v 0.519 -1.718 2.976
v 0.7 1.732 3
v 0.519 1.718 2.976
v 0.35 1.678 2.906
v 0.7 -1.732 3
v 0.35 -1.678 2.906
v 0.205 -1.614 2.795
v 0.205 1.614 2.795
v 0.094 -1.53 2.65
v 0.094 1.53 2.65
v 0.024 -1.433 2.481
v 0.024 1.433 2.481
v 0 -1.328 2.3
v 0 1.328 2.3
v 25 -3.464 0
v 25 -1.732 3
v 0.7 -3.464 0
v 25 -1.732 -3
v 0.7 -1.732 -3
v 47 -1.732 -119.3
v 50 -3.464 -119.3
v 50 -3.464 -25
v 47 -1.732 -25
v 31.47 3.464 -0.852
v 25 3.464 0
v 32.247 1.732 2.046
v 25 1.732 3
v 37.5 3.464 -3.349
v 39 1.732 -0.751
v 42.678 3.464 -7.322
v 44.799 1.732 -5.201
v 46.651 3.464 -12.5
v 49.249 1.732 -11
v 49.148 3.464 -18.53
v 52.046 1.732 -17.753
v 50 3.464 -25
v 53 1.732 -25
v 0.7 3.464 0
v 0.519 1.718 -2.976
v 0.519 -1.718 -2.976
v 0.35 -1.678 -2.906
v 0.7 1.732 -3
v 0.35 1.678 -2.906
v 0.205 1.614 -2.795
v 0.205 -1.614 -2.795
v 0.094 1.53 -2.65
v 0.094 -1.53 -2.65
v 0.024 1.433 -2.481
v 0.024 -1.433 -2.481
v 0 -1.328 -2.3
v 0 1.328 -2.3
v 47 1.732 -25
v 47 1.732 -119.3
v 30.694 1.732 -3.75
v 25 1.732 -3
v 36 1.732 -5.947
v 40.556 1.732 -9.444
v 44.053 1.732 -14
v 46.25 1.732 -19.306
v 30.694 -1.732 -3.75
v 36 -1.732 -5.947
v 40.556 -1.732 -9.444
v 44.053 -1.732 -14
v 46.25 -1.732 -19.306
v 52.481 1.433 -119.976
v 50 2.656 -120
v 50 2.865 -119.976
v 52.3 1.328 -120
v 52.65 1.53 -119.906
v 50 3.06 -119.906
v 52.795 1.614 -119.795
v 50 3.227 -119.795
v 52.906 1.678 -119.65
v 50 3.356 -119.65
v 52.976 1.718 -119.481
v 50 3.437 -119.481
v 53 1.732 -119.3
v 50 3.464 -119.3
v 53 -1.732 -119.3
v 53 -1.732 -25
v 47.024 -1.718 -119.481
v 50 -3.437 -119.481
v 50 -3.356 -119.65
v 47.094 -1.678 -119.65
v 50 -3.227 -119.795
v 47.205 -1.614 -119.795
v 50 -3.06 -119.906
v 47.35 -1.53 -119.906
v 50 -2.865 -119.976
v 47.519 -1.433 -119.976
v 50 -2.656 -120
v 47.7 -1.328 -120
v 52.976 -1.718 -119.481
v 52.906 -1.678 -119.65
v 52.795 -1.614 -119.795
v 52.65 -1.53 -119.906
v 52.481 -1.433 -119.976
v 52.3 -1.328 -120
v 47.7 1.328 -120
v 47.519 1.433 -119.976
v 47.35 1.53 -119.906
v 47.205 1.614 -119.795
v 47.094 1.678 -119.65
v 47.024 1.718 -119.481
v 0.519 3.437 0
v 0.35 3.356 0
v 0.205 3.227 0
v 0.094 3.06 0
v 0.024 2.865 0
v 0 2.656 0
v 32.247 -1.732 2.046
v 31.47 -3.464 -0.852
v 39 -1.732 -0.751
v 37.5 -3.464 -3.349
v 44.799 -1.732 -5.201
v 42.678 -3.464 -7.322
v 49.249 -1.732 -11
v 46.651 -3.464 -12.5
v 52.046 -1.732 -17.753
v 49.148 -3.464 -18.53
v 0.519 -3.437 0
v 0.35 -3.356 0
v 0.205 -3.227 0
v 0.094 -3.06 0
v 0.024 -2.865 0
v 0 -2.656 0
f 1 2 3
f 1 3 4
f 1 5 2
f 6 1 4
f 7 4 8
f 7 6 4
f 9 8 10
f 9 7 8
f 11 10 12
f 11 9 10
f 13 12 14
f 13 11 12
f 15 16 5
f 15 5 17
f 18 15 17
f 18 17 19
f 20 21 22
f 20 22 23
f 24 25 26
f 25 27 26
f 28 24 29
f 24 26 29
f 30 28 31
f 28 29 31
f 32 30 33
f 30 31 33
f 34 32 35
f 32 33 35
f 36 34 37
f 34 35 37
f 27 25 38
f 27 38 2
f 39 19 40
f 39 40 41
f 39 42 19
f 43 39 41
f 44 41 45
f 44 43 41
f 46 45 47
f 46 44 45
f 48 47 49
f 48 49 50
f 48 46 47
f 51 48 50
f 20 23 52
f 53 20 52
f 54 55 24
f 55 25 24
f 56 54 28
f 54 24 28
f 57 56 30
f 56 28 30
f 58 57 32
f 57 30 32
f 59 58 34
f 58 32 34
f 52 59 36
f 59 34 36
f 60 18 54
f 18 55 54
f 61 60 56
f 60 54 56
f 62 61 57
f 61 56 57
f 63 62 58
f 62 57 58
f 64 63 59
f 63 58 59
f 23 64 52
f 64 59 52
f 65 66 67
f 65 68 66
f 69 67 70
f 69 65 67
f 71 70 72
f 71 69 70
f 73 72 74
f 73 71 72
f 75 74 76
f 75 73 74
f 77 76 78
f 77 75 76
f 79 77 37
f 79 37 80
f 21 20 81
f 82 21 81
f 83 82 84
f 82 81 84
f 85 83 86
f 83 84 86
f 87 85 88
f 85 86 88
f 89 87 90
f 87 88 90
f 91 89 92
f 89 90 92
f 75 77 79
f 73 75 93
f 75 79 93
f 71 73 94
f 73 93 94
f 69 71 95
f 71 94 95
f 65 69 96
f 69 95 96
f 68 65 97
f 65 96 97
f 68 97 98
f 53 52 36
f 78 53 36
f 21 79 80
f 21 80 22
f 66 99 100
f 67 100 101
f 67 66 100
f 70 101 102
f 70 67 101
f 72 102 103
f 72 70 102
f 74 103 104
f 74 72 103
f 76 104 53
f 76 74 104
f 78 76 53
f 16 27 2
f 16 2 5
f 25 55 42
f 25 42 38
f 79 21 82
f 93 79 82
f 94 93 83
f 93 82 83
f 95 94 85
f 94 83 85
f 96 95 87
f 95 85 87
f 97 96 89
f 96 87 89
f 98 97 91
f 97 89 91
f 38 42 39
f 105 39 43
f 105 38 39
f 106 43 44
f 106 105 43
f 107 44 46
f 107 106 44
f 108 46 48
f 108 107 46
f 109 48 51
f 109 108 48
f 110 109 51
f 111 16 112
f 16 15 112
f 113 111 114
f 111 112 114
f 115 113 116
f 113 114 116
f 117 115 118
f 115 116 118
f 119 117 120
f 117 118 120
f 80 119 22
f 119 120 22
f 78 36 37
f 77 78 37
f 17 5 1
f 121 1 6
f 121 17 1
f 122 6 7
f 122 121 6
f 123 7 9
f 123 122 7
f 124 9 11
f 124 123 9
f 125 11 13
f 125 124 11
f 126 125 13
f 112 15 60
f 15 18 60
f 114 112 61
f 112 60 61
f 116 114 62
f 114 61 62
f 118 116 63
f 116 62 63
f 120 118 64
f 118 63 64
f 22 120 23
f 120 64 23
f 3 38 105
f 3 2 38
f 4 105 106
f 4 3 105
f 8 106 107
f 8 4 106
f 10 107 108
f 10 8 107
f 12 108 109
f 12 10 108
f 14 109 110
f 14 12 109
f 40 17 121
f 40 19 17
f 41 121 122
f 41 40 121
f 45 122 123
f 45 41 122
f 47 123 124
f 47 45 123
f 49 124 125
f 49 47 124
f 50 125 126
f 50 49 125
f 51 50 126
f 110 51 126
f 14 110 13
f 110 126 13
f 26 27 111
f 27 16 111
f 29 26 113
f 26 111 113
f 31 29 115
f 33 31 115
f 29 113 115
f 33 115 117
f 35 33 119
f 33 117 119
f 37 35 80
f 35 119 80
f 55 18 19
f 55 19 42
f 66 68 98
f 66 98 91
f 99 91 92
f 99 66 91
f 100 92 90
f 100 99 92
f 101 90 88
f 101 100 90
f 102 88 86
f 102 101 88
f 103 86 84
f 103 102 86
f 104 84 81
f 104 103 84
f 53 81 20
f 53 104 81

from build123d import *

# Parameters (mm, degrees)
F3_R = 0.7
F4_R = 0.7


with BuildPart() as f2:
    # F2: sweep along a path in F0
    with BuildLine(Plane.XZ) as f2_path:
        Line((0, 0), (25, 0))
        ThreePointArc((25, 0), (42.6776695297, -7.3223304703), (50, -25))
        Line((50, -25), (50, -120))
    # F1 (on Right) → F2 (sweep)
    with BuildSketch(Plane.YZ):
        Polygon((-1.7320508076, 3), (-3.4641016151, 0), (-1.7320508076, -3), (1.7320508076, -3), (3.4641016151, 0), (1.7320508076, 3), align=None)
    sweep(path=f2_path.line)

    # F3
    f3_edges = [f2.edges().sort_by_distance(p)[0] for p in [
        (0, 0, 3),
        (0, -2.598076, 1.5),
        (0, -2.598076, -1.5),
        (0, 0, -3),
        (0, 2.598076, -1.5),
        (0, 2.598076, 1.5),
    ]]
    fillet(f3_edges, radius=F3_R)

    # F4
    f4_edges = [f2.edges().sort_by_distance(p)[0] for p in [
        (53, 0, -120),
        (51.5, -2.598076, -120),
        (48.5, -2.598076, -120),
        (47, 0, -120),
        (48.5, 2.598076, -120),
        (51.5, 2.598076, -120),
    ]]
    fillet(f4_edges, radius=F4_R)


solid = f2.part
